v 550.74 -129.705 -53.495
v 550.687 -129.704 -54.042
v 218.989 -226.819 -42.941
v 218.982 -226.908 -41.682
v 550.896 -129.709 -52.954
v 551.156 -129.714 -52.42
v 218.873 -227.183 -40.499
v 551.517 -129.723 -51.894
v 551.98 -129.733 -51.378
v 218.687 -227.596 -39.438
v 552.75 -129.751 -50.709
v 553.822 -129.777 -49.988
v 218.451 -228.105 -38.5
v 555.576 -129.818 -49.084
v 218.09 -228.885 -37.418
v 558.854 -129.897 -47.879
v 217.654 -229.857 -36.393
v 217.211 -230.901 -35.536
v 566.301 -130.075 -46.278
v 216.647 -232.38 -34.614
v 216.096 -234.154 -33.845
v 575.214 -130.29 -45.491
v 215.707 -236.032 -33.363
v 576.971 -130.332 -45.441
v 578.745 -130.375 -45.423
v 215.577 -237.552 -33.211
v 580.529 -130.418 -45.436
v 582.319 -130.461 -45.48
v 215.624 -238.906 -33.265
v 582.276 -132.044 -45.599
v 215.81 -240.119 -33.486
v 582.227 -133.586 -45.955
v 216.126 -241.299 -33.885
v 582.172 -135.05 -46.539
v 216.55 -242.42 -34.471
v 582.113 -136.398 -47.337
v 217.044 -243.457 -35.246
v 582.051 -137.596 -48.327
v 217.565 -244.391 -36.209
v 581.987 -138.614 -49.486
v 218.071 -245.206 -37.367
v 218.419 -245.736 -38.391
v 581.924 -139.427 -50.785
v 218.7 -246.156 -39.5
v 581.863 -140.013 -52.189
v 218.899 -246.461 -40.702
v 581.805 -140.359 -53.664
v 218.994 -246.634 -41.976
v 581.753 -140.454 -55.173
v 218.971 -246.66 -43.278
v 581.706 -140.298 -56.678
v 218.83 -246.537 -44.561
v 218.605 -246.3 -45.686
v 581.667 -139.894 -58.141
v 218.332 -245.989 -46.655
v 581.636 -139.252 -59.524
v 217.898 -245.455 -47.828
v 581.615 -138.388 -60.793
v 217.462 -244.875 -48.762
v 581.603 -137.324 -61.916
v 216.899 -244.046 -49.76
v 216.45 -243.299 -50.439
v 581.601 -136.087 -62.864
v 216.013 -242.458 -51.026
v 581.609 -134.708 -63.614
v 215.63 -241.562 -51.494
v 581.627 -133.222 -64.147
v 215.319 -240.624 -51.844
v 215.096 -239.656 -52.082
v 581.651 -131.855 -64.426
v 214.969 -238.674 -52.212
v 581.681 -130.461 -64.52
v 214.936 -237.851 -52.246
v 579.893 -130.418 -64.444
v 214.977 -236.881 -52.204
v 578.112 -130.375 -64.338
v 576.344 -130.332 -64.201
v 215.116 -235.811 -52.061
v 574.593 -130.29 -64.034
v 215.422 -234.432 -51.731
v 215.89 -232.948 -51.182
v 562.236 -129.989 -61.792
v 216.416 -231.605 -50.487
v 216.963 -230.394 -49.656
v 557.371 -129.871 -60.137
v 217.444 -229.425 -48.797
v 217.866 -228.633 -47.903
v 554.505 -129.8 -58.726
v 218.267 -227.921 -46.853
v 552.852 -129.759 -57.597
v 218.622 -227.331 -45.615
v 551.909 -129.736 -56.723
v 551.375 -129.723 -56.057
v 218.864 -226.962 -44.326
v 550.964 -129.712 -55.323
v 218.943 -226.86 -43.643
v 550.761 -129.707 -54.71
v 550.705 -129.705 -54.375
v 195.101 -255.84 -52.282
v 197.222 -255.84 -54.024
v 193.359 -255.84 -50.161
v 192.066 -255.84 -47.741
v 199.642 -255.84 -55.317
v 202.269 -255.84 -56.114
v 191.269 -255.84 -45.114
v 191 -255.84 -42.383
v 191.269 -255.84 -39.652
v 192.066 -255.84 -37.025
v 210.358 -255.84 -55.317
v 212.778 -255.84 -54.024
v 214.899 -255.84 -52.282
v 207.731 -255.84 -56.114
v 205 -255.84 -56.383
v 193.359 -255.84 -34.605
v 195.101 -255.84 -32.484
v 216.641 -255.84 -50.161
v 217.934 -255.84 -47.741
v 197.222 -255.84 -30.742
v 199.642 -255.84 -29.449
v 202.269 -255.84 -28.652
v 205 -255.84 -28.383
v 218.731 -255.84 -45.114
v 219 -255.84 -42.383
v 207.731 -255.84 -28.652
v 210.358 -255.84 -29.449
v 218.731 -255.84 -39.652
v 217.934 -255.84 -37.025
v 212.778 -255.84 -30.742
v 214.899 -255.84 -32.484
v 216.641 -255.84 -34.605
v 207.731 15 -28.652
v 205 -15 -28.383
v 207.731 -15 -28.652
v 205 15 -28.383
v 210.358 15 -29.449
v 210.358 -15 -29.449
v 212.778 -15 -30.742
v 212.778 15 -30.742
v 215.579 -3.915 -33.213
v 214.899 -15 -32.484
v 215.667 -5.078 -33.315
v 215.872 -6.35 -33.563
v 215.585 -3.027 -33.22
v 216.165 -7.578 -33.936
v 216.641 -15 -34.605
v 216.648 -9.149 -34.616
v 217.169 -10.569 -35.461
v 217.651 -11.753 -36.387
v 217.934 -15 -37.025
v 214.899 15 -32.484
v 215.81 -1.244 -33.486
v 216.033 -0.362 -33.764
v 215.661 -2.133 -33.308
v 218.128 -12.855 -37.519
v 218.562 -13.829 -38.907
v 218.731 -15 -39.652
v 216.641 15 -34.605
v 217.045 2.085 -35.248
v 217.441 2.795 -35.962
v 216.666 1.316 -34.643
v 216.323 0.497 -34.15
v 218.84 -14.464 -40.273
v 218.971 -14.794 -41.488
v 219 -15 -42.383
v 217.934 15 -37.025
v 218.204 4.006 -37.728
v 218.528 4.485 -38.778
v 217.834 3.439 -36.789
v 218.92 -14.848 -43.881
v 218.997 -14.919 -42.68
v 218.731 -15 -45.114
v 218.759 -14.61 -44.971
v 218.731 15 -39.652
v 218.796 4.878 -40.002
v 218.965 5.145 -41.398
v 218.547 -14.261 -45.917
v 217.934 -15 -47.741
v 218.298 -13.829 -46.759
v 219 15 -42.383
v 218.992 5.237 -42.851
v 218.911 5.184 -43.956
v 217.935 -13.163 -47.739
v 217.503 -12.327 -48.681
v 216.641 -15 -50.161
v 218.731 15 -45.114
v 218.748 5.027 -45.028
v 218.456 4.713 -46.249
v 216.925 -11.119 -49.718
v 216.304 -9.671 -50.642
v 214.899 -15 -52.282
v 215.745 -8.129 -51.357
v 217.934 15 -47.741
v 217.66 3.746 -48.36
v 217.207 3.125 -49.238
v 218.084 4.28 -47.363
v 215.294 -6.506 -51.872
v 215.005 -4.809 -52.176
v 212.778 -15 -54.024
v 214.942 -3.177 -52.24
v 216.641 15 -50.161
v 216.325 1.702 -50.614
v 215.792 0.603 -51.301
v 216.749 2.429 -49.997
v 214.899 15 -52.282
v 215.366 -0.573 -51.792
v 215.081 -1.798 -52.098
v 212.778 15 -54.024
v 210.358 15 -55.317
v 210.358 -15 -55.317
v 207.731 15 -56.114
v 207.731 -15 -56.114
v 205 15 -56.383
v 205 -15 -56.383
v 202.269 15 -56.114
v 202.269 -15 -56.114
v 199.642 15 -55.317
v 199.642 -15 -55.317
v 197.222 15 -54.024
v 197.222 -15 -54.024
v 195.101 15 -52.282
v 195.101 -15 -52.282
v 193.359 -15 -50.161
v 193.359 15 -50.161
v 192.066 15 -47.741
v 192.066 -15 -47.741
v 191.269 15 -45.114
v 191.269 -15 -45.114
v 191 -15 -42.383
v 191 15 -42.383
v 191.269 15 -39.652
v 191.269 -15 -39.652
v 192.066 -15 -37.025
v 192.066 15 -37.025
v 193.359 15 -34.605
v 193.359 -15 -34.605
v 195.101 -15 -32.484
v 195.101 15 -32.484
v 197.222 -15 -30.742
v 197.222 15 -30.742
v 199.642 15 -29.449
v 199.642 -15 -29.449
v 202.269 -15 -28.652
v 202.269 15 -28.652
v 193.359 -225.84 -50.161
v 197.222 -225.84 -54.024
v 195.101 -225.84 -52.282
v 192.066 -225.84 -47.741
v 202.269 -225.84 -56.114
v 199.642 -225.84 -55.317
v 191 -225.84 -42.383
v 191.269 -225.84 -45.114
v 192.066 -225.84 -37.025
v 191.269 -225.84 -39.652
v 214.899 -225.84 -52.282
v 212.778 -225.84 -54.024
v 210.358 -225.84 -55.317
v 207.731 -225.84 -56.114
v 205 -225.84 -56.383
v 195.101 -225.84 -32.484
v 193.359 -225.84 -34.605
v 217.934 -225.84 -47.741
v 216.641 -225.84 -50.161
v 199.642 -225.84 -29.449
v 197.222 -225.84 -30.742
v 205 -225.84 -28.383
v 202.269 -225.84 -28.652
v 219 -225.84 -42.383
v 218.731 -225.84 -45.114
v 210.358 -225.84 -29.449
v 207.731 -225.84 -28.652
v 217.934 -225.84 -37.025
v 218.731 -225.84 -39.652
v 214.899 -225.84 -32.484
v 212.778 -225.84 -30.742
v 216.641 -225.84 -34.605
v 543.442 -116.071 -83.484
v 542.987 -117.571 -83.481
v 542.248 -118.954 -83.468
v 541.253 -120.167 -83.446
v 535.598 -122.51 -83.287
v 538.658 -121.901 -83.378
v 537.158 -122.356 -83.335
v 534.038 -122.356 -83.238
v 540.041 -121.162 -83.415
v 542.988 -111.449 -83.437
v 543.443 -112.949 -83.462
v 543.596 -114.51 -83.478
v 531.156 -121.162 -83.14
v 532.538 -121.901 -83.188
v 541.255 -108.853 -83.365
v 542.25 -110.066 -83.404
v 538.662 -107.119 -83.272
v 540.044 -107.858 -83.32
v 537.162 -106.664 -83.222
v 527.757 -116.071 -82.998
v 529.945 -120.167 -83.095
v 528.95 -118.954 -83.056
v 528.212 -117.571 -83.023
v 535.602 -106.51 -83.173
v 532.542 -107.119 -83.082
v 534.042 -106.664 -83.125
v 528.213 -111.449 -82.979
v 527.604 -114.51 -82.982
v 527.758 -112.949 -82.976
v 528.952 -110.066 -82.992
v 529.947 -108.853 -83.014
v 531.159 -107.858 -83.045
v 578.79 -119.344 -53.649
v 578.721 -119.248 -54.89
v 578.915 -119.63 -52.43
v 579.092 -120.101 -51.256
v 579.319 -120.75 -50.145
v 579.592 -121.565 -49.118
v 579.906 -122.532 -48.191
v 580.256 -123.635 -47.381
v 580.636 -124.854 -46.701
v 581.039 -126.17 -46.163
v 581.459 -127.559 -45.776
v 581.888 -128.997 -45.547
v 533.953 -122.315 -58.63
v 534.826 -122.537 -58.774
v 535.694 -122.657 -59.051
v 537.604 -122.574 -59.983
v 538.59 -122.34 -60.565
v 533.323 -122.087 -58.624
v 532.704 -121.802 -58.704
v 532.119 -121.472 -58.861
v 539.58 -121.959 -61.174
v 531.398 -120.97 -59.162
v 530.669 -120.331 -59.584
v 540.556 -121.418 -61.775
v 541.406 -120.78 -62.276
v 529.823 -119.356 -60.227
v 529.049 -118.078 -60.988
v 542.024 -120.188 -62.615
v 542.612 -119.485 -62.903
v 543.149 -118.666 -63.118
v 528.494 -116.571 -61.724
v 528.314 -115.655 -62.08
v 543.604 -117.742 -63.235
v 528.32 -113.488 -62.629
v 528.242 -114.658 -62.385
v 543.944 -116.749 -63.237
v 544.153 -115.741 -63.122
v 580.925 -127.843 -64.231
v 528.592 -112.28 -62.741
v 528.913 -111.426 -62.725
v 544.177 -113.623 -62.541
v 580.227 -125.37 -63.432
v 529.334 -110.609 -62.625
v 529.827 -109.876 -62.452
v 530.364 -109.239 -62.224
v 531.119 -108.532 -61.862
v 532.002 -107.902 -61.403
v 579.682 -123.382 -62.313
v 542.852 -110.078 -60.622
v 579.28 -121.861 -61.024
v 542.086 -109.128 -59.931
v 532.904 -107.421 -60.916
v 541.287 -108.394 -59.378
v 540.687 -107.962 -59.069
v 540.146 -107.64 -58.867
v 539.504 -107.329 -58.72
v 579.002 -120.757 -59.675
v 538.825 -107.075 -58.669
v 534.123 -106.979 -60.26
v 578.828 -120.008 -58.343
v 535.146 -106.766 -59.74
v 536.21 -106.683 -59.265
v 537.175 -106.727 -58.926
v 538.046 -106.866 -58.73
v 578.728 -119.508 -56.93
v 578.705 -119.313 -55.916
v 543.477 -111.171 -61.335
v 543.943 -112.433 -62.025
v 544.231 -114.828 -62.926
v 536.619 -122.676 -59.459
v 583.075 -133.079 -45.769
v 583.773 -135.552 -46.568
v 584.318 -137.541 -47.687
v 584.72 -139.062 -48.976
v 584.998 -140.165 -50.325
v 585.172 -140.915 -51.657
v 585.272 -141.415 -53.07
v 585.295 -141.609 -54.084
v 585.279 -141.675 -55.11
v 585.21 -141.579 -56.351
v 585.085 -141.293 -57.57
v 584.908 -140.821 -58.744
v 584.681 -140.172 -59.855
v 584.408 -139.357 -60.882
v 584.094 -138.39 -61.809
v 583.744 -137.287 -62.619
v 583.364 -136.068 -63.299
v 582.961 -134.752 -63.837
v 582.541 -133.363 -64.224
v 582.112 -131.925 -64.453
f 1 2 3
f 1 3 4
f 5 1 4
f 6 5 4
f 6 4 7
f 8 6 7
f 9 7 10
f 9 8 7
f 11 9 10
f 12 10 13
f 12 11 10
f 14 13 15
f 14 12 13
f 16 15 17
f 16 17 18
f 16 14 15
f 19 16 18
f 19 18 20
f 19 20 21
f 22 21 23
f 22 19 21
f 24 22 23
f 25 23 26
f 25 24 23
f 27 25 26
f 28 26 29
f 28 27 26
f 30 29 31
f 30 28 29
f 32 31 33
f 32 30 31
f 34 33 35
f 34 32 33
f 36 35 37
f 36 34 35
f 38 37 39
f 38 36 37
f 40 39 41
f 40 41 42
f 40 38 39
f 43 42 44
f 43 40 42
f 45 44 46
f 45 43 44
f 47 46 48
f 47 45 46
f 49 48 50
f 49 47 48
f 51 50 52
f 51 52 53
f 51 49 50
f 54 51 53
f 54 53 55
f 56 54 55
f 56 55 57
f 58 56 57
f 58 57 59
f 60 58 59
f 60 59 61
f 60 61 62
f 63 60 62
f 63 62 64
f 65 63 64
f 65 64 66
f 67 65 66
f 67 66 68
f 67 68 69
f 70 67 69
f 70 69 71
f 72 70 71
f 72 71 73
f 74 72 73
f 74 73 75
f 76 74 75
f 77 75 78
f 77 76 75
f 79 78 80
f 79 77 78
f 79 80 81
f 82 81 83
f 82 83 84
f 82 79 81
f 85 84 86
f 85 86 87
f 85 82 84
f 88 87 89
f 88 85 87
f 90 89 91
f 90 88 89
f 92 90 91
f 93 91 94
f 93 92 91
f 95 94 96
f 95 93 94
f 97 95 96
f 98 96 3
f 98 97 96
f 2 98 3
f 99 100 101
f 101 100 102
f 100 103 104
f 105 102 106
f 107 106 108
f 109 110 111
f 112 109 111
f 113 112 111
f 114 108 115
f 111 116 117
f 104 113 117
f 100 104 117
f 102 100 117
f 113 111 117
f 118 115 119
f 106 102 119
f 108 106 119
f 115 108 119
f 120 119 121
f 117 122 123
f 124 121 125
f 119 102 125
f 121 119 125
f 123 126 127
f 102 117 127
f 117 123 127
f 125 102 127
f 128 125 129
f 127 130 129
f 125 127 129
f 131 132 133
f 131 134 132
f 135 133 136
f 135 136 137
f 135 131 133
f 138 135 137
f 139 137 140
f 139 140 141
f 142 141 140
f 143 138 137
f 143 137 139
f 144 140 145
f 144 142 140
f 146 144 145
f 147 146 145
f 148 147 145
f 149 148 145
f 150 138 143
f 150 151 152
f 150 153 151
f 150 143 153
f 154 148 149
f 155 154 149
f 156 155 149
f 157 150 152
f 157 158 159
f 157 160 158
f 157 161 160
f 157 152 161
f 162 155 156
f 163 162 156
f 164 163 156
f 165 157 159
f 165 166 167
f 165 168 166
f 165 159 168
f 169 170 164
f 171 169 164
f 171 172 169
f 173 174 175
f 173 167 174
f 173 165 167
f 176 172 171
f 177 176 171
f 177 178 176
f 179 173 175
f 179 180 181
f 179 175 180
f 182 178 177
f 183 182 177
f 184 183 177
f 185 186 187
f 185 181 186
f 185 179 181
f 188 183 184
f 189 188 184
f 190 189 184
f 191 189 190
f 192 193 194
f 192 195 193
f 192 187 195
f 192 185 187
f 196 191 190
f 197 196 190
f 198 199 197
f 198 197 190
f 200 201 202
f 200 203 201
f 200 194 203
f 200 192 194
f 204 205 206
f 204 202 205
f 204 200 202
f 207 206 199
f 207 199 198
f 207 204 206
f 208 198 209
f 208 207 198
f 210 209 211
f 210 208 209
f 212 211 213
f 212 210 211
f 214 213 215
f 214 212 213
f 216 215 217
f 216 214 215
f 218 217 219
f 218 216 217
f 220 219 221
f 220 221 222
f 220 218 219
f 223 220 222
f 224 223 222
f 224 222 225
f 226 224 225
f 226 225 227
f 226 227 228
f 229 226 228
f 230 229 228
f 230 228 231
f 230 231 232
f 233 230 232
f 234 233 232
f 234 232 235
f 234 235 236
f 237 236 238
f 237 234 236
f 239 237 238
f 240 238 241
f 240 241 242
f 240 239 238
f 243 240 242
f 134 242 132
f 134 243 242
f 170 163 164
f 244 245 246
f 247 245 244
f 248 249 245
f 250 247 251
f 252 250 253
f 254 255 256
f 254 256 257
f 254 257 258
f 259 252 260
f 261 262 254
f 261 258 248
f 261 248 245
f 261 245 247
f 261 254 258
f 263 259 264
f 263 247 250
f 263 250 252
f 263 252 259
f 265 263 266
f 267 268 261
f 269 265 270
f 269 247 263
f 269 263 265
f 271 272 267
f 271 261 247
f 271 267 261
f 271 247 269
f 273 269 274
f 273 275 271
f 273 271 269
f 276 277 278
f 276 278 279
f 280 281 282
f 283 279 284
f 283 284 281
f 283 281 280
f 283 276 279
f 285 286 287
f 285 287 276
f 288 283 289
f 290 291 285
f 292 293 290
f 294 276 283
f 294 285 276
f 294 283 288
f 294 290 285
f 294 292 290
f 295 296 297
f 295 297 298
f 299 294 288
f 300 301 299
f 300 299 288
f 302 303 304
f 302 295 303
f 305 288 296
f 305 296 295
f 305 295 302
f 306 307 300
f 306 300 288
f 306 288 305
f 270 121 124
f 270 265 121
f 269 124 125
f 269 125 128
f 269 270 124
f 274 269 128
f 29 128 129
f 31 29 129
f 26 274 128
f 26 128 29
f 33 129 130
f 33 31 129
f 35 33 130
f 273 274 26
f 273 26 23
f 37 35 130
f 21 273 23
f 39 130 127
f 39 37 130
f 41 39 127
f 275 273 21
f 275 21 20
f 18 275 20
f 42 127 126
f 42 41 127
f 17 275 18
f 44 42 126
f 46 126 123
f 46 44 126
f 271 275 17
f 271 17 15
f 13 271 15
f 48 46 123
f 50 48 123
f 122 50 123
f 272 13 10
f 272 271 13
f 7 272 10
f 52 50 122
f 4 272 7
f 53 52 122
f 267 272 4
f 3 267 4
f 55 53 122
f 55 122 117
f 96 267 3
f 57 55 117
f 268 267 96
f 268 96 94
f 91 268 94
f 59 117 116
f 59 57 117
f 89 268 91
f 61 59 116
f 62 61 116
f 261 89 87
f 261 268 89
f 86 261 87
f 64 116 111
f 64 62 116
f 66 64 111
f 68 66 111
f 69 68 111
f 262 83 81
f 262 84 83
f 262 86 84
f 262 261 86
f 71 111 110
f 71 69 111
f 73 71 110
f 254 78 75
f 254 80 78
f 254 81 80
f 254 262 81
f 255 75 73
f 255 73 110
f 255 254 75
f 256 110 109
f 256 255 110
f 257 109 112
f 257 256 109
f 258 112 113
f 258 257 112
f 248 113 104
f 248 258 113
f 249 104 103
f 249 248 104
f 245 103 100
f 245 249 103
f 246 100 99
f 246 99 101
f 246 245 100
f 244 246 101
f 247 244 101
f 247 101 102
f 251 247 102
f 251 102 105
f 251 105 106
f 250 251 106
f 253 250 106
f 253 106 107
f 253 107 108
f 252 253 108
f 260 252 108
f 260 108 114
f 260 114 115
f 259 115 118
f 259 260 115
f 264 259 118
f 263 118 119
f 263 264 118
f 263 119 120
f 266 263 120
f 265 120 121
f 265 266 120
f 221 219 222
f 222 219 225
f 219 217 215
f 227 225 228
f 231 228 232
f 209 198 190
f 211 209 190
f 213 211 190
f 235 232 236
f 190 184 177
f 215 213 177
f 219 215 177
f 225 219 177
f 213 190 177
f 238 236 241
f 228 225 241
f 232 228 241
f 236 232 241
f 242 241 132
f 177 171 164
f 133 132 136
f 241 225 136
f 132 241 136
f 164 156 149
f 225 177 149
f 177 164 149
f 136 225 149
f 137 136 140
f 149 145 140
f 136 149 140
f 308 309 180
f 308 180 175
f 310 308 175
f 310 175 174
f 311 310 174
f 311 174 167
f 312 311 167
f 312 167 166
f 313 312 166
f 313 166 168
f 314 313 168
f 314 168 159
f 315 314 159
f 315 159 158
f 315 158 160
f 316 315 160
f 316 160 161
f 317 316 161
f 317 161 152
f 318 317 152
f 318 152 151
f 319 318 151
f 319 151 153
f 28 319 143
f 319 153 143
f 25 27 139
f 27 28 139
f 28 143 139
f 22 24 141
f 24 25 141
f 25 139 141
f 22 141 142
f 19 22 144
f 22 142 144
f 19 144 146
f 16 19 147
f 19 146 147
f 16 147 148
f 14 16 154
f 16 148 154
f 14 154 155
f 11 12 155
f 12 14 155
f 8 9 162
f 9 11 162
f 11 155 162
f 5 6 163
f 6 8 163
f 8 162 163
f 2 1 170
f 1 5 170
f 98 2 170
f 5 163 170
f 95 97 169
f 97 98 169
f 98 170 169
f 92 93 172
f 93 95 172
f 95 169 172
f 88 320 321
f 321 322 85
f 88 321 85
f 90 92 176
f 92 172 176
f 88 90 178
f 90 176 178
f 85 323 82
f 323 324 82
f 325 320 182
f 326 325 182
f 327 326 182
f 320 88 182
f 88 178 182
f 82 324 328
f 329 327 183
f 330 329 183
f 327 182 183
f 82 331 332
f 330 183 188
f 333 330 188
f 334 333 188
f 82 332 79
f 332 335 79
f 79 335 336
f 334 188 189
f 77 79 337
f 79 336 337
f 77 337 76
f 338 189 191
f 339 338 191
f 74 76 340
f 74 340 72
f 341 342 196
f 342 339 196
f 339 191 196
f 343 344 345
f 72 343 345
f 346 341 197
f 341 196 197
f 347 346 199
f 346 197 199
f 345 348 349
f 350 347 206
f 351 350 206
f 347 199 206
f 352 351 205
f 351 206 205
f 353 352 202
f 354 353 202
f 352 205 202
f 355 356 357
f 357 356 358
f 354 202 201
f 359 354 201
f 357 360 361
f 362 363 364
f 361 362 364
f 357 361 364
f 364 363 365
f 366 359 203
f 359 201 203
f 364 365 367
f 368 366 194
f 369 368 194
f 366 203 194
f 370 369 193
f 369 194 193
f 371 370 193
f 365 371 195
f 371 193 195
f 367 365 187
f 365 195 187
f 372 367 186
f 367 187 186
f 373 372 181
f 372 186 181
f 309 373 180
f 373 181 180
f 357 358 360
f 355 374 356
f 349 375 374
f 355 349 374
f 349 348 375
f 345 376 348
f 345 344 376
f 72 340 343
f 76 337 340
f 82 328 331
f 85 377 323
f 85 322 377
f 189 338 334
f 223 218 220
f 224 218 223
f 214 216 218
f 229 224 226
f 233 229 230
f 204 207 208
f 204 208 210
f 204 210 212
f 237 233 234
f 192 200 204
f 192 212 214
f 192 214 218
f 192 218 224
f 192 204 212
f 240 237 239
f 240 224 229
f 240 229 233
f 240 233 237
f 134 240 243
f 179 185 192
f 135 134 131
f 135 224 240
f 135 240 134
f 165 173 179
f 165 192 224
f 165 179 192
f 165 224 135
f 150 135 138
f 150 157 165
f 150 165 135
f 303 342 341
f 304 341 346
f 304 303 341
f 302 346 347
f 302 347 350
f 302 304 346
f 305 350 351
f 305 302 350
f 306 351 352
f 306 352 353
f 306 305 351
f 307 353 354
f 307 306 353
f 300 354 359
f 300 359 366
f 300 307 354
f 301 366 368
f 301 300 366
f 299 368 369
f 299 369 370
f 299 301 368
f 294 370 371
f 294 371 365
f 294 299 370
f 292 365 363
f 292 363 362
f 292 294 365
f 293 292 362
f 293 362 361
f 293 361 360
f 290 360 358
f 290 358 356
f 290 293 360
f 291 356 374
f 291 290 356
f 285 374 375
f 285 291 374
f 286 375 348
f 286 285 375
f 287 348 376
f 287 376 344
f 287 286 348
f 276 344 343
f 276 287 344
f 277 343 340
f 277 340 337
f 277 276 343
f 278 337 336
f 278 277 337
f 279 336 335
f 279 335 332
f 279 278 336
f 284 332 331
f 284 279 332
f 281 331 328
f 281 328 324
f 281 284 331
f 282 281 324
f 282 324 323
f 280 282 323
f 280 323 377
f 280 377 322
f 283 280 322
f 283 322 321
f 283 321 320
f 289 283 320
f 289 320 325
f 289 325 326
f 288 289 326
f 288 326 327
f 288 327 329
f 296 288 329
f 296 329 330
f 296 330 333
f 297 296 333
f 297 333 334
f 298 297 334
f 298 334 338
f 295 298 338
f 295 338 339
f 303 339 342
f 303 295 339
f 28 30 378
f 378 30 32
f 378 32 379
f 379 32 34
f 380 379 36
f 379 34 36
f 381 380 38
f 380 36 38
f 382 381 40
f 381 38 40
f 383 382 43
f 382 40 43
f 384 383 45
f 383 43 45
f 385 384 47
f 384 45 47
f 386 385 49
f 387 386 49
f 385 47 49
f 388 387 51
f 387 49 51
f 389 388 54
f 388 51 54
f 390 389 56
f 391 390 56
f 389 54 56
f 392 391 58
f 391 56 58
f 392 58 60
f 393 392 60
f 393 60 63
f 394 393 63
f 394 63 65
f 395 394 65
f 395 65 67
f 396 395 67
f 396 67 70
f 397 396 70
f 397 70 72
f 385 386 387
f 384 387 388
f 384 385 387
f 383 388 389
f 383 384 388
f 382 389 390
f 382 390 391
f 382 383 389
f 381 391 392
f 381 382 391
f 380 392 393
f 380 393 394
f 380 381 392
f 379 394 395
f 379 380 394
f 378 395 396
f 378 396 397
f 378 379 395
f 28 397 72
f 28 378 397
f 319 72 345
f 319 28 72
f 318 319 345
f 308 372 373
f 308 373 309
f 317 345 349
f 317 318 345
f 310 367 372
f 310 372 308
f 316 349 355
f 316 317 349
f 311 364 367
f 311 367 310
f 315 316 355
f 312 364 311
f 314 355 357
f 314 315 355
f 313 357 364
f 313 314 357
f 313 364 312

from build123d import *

# Parameters (mm, degrees)
SUSP_FR_LCA_FRONT_LEG_PROFILE_R         = 9.525
SUSP_FR_LCA_REAR_LEG_START              = 194.971257269
SUSP_FR_LCA_REAR_LEG_OUTLINE_R          = 9.525
SUSP_FR_LCA_REAR_LEG_DEPTH              = 392.368202981
SUSP_FR_LCA_REAR_LEG_START_2            = 587.33946025
SUSP_FR_LCA_REAR_LEG_2_OUTLINE_R        = 9.525
SUSP_FR_LCA_REAR_LEG_2_DEPTH            = 13.53250199
SUSP_FR_LCA_REAR_LEG_START_3            = 523.39106775
SUSP_FR_LCA_REAR_LEG_3_OUTLINE_W        = 26
SUSP_FR_LCA_REAR_LEG_3_OUTLINE_H        = 23
SUSP_FR_LCA_REAR_LEG_3_DEPTH            = 11.60893225
SUSP_FR_LCA_BUSH_FRONT_PROFILE_R        = 14
SUSP_FR_LCA_BUSH_REAR_PROFILE_R         = 14
SUSP_FR_PUSHROD_MOUNT_BRACKET_PROFILE_R = 8


with BuildPart() as part:
    # SUSP_FR_LCA_front_leg: sweep along a curve in space
    with BuildLine() as susp_fr_lca_front_leg_path:
        Line((205, -240.84, -42.383), (582, -130.461196, -55))
    # SUSP_FR_LCA_front_leg profile (on start of the path) → SUSP_FR_LCA_front_leg (sweep)
    with BuildSketch(Plane(origin=(205, -240.84, -42.383), x_dir=(-0.2809863080066093, 0.9597117768959672, 0), z_dir=(0.9592171404331008, 0.28084148736685866, -0.03210196992266429))):
        Circle(SUSP_FR_LCA_FRONT_LEG_PROFILE_R)
    sweep(path=susp_fr_lca_front_leg_path.line)

    # SUSP_FR_LCA_rear_leg: read off the stored shape, not the designer's step
    # SUSP_FR_LCA_rear_leg outline → SUSP_FR_LCA_rear_leg (add)
    with BuildSketch(Plane(origin=(0, 0, 0), x_dir=(0.3266773785489796, 0.9450726759891053, -0.01093286070332221), z_dir=(0.9445438654680327, -0.3268602715210149, -0.031610901725756396)).offset(SUSP_FR_LCA_REAR_LEG_START)):
        with Locations((67.432230038, -35.502420765)):
            Circle(SUSP_FR_LCA_REAR_LEG_OUTLINE_R)
    extrude(amount=SUSP_FR_LCA_REAR_LEG_DEPTH)

    # SUSP_FR_LCA_rear_leg 2 outline → SUSP_FR_LCA_rear_leg 2 (add)
    with BuildSketch(Plane(origin=(0, 0, 0), x_dir=(0.3266773785489796, 0.9450726759891053, -0.01093286070332221), z_dir=(0.9445438654680327, -0.3268602715210149, -0.031610901725756396)).offset(SUSP_FR_LCA_REAR_LEG_START_2)):
        with Locations((67.432230038, -35.502420765)):
            Circle(SUSP_FR_LCA_REAR_LEG_2_OUTLINE_R)
    extrude(amount=SUSP_FR_LCA_REAR_LEG_2_DEPTH)

    # SUSP_FR_LCA_rear_leg 3 outline → SUSP_FR_LCA_rear_leg 3 (cut)
    with BuildSketch(Plane(origin=(0, 0, 0), x_dir=(-0.28068434396715386, 0.959754165905817, 0.009393619012821172), z_dir=(0.9592171404331008, 0.2808414873668589, -0.03210196992266429)).offset(SUSP_FR_LCA_REAR_LEG_START_3)):
        with Locations((-289, -35.5)):
            Rectangle(SUSP_FR_LCA_REAR_LEG_3_OUTLINE_W, SUSP_FR_LCA_REAR_LEG_3_OUTLINE_H)
    extrude(amount=SUSP_FR_LCA_REAR_LEG_3_DEPTH, mode=Mode.SUBTRACT)

    # SUSP_FR_LCA_bush_front: sweep along a curve in space
    with BuildLine() as susp_fr_lca_bush_front_path:
        Line((205, -255.84, -42.383), (205, -225.84, -42.383))
    # SUSP_FR_LCA_bush_front profile (on start of the path) → SUSP_FR_LCA_bush_front (sweep)
    with BuildSketch(Plane(origin=(205, -255.84, -42.383), x_dir=(0, 0, 1), z_dir=(0, 1, 0))):
        Circle(SUSP_FR_LCA_BUSH_FRONT_PROFILE_R)
    sweep(path=susp_fr_lca_bush_front_path.line)

    # SUSP_FR_LCA_bush_rear: sweep along a curve in space
    with BuildLine() as susp_fr_lca_bush_rear_path:
        Line((205, -15, -42.383), (205, 15, -42.383))
    # SUSP_FR_LCA_bush_rear profile (on start of the path) → SUSP_FR_LCA_bush_rear (sweep)
    with BuildSketch(Plane(origin=(205, -15, -42.383), x_dir=(0, 0, 1), z_dir=(0, 1, 0))):
        Circle(SUSP_FR_LCA_BUSH_REAR_PROFILE_R)
    sweep(path=susp_fr_lca_bush_rear_path.line)

    # SUSP_FR_pushrod_mount_bracket: sweep along a curve in space
    with BuildLine() as susp_fr_pushrod_mount_bracket_path:
        Line((536.521845, -114.723439, -53.4779897), (535.6, -114.51, -83.23))
    # SUSP_FR_pushrod_mount_bracket profile (on start of the path) → SUSP_FR_pushrod_mount_bracket (sweep)
    with BuildSketch(Plane(origin=(536.521845, -114.723439, -53.4779897), x_dir=(-0.9995203321410445, 0, 0.0309694306802064), z_dir=(-0.030968634548961455, 0.007170309964793488, -0.999494637468947))):
        Circle(SUSP_FR_PUSHROD_MOUNT_BRACKET_PROFILE_R)
    sweep(path=susp_fr_pushrod_mount_bracket_path.line)


solid = part.part
